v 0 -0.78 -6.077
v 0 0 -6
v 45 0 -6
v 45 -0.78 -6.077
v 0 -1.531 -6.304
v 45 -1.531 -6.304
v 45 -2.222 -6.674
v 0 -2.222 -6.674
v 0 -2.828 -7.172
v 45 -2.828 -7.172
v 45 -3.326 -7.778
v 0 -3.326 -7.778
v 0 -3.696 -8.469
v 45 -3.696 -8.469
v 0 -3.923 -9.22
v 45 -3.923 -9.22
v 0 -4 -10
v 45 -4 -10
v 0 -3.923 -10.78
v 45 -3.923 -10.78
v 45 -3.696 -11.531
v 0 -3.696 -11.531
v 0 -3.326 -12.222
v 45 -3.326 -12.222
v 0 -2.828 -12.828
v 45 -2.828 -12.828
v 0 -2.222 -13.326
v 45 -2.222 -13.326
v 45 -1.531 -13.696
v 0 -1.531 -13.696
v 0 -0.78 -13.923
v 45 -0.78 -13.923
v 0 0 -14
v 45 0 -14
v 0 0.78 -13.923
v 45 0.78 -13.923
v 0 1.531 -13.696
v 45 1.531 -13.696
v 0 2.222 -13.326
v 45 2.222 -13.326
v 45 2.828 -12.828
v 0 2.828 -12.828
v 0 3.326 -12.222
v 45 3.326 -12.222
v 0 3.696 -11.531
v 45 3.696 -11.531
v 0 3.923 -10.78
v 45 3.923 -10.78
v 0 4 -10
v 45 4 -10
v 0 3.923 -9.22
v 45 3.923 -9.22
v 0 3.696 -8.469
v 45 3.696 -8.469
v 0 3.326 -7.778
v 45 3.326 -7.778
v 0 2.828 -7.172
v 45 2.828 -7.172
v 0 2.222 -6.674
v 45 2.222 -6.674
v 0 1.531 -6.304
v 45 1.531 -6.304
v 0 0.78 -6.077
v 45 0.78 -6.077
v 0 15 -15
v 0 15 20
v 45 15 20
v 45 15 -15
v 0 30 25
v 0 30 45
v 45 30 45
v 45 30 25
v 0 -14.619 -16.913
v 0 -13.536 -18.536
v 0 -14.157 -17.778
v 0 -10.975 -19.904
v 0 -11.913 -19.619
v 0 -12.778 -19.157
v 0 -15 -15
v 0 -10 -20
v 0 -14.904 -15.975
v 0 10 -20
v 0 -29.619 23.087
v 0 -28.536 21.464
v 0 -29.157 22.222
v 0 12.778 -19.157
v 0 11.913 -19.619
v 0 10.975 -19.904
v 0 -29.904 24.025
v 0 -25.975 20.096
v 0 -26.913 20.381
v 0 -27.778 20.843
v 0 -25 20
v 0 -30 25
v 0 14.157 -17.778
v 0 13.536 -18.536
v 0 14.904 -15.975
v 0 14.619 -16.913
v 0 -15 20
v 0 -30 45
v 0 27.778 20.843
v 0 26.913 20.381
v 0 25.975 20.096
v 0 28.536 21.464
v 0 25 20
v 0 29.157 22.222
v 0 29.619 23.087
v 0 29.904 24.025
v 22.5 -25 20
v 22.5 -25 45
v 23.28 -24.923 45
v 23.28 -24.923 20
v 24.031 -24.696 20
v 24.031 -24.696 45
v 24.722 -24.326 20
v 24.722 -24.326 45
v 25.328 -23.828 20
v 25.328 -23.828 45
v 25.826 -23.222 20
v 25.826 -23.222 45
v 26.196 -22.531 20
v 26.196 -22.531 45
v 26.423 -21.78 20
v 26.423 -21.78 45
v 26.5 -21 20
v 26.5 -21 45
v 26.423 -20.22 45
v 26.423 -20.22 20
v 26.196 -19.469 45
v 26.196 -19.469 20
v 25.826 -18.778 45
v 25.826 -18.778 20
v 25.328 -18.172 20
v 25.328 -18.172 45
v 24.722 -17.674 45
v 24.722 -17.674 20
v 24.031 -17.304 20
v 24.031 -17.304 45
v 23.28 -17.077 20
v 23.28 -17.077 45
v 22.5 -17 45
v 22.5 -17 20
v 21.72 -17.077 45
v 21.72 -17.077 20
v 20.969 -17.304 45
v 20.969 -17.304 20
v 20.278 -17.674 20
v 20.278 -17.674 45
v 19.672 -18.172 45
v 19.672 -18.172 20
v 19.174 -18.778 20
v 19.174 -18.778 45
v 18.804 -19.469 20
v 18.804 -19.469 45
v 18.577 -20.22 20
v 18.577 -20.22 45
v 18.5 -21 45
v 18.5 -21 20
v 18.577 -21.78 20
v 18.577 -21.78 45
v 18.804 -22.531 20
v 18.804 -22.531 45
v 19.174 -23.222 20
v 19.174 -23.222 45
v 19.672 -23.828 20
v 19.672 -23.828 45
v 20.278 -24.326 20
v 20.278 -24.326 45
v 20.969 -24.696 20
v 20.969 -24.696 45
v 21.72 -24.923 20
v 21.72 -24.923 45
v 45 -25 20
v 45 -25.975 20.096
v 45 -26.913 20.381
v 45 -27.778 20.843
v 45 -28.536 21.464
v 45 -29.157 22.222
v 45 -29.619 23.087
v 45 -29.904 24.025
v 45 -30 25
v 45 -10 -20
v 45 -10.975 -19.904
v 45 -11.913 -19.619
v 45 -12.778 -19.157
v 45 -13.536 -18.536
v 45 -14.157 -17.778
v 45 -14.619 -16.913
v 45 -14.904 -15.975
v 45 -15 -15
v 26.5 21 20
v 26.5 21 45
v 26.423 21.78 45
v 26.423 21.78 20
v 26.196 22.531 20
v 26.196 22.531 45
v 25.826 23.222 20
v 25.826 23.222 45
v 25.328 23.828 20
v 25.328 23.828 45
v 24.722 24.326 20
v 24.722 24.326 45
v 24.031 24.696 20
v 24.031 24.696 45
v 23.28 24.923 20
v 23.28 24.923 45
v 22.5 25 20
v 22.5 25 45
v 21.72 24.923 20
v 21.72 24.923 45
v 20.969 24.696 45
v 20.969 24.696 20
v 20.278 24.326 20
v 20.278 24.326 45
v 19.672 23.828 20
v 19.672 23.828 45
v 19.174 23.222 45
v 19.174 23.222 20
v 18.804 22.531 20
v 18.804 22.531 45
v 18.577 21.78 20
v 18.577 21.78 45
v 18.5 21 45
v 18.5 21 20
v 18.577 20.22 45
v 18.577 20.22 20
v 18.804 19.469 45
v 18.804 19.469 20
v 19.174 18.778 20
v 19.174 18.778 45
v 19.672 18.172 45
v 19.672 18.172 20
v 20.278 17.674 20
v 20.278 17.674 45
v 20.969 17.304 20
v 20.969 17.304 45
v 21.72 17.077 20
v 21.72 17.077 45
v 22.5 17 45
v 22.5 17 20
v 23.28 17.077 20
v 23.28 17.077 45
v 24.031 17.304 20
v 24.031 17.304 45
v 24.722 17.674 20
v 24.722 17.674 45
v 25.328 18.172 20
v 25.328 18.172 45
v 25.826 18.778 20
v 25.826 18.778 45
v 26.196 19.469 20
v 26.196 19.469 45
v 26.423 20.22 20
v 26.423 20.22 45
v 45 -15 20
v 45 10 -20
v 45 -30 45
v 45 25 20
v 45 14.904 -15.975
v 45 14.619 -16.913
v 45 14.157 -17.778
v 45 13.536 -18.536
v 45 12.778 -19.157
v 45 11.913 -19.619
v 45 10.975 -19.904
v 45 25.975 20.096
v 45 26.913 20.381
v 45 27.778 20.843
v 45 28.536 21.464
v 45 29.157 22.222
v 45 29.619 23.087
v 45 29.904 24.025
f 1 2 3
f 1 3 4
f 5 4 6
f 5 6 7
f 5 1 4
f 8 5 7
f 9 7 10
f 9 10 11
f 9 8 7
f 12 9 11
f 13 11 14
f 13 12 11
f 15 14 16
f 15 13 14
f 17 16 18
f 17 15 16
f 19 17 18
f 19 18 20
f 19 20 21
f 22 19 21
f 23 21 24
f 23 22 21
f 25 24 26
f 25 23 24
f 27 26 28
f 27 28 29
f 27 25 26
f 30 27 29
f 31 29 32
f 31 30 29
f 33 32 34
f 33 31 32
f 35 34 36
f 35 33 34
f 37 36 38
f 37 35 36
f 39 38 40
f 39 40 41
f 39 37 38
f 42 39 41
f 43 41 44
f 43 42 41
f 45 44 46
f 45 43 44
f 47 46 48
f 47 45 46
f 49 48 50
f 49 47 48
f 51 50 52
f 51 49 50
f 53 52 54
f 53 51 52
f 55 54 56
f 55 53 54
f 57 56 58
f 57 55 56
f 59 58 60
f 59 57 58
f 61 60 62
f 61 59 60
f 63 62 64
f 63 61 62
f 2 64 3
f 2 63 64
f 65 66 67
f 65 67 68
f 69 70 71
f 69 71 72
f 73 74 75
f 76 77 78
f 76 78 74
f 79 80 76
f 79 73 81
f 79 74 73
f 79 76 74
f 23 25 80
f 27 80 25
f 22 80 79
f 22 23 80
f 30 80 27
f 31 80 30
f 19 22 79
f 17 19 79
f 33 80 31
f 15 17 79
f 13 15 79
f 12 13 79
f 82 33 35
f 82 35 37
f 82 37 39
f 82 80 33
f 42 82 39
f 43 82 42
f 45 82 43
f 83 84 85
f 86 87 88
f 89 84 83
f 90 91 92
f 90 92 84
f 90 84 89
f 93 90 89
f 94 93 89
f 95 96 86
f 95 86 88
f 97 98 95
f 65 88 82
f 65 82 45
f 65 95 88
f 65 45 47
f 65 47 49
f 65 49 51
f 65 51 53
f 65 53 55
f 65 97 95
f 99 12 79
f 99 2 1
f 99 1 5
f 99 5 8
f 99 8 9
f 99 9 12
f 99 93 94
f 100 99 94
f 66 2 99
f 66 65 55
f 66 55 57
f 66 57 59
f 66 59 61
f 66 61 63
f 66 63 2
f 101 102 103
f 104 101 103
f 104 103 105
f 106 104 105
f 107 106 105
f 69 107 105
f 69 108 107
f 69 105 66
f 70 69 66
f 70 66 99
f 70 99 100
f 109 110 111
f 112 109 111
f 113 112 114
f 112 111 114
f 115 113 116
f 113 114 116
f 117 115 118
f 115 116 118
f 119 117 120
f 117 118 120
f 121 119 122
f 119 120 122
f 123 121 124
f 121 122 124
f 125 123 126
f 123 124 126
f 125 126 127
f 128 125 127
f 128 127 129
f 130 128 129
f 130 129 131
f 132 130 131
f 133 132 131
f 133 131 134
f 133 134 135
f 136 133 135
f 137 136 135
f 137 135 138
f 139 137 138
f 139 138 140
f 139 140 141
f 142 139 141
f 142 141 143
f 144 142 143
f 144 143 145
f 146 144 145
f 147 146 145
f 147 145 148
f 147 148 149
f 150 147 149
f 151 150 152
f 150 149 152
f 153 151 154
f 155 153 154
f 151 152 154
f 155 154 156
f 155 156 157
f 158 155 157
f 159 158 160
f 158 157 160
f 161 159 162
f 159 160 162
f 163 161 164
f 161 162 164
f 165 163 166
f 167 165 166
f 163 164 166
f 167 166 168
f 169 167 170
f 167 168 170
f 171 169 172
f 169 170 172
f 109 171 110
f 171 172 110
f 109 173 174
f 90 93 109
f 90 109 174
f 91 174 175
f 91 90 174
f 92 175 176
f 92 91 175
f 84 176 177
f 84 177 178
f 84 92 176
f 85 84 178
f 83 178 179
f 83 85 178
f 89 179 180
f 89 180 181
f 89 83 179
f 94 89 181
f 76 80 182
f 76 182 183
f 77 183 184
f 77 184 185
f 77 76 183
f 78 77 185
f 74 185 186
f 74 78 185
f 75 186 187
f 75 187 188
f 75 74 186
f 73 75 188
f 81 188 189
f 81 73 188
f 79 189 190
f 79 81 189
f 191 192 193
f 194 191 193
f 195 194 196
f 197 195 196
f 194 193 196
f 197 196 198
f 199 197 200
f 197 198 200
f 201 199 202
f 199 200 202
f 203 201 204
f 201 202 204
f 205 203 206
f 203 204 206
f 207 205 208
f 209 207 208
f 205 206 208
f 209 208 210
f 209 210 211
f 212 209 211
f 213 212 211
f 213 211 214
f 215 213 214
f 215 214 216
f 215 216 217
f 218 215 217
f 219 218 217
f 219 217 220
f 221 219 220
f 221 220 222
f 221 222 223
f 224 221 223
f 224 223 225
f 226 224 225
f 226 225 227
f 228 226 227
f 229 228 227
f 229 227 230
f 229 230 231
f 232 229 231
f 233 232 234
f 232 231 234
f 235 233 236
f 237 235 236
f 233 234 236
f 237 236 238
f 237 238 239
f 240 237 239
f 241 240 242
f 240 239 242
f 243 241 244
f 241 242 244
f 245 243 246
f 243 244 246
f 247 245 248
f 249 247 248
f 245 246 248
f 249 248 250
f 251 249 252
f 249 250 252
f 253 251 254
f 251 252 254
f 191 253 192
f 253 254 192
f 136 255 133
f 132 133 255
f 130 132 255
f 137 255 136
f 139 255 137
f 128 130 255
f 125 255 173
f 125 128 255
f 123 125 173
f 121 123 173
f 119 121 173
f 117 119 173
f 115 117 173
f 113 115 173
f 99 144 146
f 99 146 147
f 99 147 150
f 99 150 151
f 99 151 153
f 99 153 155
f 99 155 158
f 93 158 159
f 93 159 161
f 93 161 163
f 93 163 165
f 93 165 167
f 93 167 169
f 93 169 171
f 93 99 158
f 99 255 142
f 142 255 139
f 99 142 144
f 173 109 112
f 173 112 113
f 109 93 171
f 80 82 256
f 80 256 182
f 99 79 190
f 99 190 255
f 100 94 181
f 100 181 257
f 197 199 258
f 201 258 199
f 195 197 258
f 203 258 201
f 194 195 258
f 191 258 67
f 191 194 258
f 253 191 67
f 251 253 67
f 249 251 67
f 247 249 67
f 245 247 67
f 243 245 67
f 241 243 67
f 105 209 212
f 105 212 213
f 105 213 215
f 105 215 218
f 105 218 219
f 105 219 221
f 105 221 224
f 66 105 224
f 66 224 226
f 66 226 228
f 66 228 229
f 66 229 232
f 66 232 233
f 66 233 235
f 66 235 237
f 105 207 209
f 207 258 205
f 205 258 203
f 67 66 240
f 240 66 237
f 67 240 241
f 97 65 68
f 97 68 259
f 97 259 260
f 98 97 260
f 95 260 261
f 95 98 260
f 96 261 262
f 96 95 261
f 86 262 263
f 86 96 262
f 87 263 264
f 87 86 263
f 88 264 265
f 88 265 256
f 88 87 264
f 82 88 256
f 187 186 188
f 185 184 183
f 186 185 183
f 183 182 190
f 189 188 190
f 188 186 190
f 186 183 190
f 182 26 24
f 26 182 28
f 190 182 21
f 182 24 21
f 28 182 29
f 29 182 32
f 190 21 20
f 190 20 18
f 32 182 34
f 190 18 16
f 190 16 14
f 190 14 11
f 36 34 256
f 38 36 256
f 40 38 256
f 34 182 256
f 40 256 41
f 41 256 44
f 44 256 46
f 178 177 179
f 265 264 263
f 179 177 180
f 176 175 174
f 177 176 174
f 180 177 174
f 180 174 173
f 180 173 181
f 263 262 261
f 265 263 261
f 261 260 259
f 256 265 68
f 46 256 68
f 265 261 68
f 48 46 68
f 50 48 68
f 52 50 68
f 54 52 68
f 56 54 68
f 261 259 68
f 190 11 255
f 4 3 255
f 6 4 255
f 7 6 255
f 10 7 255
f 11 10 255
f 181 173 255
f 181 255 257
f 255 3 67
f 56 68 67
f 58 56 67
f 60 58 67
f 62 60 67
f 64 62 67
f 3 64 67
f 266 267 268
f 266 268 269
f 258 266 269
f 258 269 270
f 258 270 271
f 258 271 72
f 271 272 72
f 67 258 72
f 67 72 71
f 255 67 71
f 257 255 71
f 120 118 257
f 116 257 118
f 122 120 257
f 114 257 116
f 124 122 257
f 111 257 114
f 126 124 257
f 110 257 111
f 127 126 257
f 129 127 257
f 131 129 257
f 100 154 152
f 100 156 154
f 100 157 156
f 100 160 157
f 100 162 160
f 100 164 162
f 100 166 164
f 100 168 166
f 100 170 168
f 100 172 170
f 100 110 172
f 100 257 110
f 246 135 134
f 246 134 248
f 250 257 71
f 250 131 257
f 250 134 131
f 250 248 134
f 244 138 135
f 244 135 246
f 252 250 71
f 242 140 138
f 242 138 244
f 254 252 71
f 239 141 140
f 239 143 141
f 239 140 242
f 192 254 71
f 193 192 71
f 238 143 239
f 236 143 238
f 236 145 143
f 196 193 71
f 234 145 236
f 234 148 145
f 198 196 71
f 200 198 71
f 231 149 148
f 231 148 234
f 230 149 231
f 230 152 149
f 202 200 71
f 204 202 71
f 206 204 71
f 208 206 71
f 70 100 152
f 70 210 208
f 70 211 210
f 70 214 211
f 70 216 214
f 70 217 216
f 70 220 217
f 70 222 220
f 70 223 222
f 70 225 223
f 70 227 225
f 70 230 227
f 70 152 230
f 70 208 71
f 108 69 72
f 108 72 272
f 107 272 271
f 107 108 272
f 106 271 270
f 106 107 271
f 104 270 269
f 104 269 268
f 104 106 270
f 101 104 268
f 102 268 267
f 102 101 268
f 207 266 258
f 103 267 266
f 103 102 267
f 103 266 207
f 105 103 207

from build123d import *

# Parameters (mm, degrees)
SKETCH_1_R          = 4
EXTRUDE_1_DEPTH     = 45
SKETCH_2_R          = 4
CUT_EXTRUDE_1_DEPTH = 45


with BuildPart() as part:
    # 草图1 → 凸台-拉伸1 (new body)
    with BuildSketch(Plane(origin=(0, 0, 0), x_dir=(0, 0, -1), z_dir=(1, 0, 0))):
        with BuildLine():
            Line((-20, 15), (15, 15))
            ThreePointArc((15, 15), (18.535533906, 13.535533906), (20, 10))
            Line((20, 10), (20, -10))
            ThreePointArc((20, -10), (18.535533906, -13.535533906), (15, -15))
            Line((15, -15), (-20, -15))
            Line((-20, -15), (-20, -25))
            ThreePointArc((-20, -25), (-21.464466094, -28.535533906), (-25, -30))
            Line((-25, -30), (-45, -30))
            Line((-45, -30), (-45, 30))
            Line((-45, 30), (-25, 30))
            ThreePointArc((-25, 30), (-21.464466094, 28.535533906), (-20, 25))
            Line((-20, 25), (-20, 15))
        make_face()
        with Locations(Location((10, 0, 0), (0, 0, 180))):
            Circle(SKETCH_1_R, mode=Mode.SUBTRACT)
    extrude(amount=EXTRUDE_1_DEPTH)

    # 草图2 → 切除-拉伸1 (cut)
    with BuildSketch(Plane.XY.offset(45)):
        with Locations((22.5, 21)):
            Circle(SKETCH_2_R)
        with Locations(Location((22.5, -21, 0), (0, 0, 270))):
            Circle(SKETCH_2_R)
    extrude(amount=-CUT_EXTRUDE_1_DEPTH, mode=Mode.SUBTRACT)


solid = part.part
